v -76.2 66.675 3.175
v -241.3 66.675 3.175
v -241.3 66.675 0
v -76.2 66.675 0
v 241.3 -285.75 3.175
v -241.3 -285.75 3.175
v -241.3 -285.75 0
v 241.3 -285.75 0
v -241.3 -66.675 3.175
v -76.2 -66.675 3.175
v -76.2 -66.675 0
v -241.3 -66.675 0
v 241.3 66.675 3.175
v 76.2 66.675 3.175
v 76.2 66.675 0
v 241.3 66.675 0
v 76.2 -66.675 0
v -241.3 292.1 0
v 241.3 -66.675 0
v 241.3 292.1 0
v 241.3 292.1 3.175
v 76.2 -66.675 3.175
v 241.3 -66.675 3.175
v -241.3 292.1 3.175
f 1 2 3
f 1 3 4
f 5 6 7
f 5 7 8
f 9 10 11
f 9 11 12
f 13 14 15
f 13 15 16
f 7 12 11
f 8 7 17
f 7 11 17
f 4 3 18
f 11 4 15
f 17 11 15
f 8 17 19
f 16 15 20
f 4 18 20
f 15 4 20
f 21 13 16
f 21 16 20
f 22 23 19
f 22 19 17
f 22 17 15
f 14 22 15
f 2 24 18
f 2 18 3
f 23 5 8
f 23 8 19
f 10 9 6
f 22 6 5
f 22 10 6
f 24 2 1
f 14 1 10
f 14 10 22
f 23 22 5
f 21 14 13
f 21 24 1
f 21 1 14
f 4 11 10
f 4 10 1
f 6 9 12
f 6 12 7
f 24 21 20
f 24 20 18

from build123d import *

# Parameters (mm, degrees)
F0_W     = 152.4
F0_H     = 133.35
F1_DEPTH = 3.175
F3_DEPTH = 3.175


with BuildPart() as f1:
    # F0 (on Top) → F1 (new body)
    with BuildSketch(Plane.XY):
        Rectangle(F0_W, F0_H)
    extrude(amount=F1_DEPTH)

    # F2 (on face) → F3 (join)
    with BuildSketch(Plane.XY.offset(3.175)):
        Polygon((-241.3, 292.1), (-241.3, 66.675), (-76.2, 66.675), (76.2, 66.675), (241.3, 66.675), (241.3, 292.1), align=None)
        Polygon((76.2, -66.675), (-76.2, -66.675), (-241.3, -66.675), (-241.3, -285.75), (241.3, -285.75), (241.3, -66.675), align=None)
    extrude(amount=-F3_DEPTH)


with BuildPart() as f4_1:
    # F4: copy of F1
    add(f1.part)


solid = f1.part
